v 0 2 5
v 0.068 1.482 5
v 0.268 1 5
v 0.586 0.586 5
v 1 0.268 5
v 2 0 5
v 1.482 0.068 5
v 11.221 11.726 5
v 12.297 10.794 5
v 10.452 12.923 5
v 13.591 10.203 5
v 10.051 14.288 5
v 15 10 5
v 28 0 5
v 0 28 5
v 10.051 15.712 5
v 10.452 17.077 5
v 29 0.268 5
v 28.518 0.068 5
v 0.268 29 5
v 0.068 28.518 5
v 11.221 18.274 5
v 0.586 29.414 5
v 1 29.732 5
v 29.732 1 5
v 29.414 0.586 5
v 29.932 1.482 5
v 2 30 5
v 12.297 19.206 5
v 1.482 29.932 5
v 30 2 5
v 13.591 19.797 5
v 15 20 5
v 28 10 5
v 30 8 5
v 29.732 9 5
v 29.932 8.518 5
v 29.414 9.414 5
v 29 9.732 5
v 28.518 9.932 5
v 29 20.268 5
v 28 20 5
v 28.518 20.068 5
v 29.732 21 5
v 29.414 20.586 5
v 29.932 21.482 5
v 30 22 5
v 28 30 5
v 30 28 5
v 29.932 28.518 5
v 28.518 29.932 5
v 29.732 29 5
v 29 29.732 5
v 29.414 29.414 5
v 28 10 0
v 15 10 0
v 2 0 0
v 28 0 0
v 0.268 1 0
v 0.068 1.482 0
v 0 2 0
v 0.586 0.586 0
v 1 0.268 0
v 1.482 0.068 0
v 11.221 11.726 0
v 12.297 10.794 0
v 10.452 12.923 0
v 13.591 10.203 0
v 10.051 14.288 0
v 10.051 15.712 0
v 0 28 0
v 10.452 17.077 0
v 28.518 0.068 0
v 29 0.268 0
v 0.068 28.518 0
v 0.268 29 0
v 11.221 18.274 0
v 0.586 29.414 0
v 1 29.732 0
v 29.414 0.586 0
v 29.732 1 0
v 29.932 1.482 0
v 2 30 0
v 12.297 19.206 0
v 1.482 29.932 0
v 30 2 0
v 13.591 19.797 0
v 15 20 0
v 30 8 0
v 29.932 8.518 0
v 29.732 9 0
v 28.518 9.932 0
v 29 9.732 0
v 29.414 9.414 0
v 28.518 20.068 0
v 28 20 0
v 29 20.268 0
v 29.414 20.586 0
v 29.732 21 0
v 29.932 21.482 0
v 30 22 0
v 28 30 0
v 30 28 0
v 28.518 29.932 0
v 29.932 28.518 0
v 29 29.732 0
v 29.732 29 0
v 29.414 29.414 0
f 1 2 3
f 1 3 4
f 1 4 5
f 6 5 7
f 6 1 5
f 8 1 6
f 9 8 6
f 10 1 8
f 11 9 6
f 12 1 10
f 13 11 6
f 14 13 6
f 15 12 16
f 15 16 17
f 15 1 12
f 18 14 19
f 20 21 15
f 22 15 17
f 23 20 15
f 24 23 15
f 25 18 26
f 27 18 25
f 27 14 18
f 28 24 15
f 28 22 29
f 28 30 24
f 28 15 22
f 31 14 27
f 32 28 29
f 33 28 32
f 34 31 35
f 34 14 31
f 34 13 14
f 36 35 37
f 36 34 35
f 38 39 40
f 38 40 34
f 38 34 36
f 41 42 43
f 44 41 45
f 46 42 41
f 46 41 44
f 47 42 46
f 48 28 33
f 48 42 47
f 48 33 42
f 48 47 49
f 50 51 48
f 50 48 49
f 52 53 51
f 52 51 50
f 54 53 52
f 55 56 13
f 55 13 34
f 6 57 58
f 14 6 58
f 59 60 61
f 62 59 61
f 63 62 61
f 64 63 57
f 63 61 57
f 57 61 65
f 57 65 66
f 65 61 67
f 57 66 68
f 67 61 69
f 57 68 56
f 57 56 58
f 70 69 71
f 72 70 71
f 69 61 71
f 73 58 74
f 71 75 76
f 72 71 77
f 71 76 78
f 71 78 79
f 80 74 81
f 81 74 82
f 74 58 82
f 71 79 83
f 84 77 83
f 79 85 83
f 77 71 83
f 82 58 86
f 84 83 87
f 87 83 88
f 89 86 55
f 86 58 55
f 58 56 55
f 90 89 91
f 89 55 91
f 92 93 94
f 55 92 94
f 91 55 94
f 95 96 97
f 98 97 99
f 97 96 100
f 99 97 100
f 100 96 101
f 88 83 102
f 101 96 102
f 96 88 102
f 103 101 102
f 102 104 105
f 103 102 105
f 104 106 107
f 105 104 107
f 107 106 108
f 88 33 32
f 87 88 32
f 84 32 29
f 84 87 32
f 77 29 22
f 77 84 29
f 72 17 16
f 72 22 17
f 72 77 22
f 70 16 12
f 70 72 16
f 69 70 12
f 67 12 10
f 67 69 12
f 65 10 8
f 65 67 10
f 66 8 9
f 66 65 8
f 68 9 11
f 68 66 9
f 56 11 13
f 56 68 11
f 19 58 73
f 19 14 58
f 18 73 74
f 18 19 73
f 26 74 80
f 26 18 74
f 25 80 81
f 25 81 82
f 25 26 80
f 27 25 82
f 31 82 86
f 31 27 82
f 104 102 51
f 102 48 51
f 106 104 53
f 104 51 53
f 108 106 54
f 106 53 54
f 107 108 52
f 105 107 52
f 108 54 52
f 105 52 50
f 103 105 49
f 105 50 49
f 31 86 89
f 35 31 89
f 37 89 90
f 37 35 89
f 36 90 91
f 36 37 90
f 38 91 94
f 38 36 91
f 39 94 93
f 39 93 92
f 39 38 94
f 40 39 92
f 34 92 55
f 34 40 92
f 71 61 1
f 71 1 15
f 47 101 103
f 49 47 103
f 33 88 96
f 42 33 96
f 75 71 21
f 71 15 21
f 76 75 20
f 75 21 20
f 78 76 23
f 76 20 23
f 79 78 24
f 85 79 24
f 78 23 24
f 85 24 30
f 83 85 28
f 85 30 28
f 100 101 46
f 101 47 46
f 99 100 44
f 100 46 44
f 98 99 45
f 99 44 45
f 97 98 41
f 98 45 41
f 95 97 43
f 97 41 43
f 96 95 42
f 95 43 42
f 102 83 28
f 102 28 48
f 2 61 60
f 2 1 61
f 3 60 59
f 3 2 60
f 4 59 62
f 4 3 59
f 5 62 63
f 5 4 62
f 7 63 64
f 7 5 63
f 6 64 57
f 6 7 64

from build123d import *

# Parameters (mm, degrees)
ESQUISSE1_W                  = 30
ESQUISSE1_H                  = 30
BOSS_EXTRU_1_DEPTH           = 5
ENL_V_MAT_EXTRU_1_DEPTH      = 43.720018727
ENL_V_MAT_EXTRU_1_DEPTH_BACK = 43.720018727
ESQUISSE2_R                  = 5
ENL_V_MAT_EXTRU_2_DEPTH      = 43.720018727
ENL_V_MAT_EXTRU_2_DEPTH_BACK = 43.720018727
ESQUISSE3_W                  = 15
ESQUISSE3_H                  = 10
CONG_1_R                     = 2


with BuildPart() as part:
    # Esquisse1 → Boss.-Extru.1 (new body)
    with BuildSketch(Plane.XY):
        with Locations((15, 15)):
            Rectangle(ESQUISSE1_W, ESQUISSE1_H)
    extrude(amount=BOSS_EXTRU_1_DEPTH)

    # Esquisse2 → Enlèv. mat.-Extru.1 (cut, two sides: drawn at the far end of the back side and taken through both)
    with BuildSketch(Plane.XY.offset(5).offset(-ENL_V_MAT_EXTRU_1_DEPTH_BACK)):
        with Locations((15, 15)):
            Circle(ESQUISSE2_R)
    extrude(amount=ENL_V_MAT_EXTRU_1_DEPTH + ENL_V_MAT_EXTRU_1_DEPTH_BACK, mode=Mode.SUBTRACT)

    # Esquisse3 → Enlèv. mat.-Extru.2 (cut, two sides: drawn at the far end of the back side and taken through both)
    with BuildSketch(Plane.XY.offset(5).offset(-ENL_V_MAT_EXTRU_2_DEPTH_BACK)):
        with Locations((22.5, 15)):
            Rectangle(ESQUISSE3_W, ESQUISSE3_H)
    extrude(amount=ENL_V_MAT_EXTRU_2_DEPTH + ENL_V_MAT_EXTRU_2_DEPTH_BACK, mode=Mode.SUBTRACT)

    # Congé1
    cong_1_edges = [part.edges().sort_by_distance(p)[0] for p in [
        (30, 10, 2.5),
        (30, 20, 2.5),
        (30, 30, 2.5),
        (30, 0, 2.5),
        (0, 0, 2.5),
        (0, 30, 2.5),
    ]]
    fillet(cong_1_edges, radius=CONG_1_R)


solid = part.part
